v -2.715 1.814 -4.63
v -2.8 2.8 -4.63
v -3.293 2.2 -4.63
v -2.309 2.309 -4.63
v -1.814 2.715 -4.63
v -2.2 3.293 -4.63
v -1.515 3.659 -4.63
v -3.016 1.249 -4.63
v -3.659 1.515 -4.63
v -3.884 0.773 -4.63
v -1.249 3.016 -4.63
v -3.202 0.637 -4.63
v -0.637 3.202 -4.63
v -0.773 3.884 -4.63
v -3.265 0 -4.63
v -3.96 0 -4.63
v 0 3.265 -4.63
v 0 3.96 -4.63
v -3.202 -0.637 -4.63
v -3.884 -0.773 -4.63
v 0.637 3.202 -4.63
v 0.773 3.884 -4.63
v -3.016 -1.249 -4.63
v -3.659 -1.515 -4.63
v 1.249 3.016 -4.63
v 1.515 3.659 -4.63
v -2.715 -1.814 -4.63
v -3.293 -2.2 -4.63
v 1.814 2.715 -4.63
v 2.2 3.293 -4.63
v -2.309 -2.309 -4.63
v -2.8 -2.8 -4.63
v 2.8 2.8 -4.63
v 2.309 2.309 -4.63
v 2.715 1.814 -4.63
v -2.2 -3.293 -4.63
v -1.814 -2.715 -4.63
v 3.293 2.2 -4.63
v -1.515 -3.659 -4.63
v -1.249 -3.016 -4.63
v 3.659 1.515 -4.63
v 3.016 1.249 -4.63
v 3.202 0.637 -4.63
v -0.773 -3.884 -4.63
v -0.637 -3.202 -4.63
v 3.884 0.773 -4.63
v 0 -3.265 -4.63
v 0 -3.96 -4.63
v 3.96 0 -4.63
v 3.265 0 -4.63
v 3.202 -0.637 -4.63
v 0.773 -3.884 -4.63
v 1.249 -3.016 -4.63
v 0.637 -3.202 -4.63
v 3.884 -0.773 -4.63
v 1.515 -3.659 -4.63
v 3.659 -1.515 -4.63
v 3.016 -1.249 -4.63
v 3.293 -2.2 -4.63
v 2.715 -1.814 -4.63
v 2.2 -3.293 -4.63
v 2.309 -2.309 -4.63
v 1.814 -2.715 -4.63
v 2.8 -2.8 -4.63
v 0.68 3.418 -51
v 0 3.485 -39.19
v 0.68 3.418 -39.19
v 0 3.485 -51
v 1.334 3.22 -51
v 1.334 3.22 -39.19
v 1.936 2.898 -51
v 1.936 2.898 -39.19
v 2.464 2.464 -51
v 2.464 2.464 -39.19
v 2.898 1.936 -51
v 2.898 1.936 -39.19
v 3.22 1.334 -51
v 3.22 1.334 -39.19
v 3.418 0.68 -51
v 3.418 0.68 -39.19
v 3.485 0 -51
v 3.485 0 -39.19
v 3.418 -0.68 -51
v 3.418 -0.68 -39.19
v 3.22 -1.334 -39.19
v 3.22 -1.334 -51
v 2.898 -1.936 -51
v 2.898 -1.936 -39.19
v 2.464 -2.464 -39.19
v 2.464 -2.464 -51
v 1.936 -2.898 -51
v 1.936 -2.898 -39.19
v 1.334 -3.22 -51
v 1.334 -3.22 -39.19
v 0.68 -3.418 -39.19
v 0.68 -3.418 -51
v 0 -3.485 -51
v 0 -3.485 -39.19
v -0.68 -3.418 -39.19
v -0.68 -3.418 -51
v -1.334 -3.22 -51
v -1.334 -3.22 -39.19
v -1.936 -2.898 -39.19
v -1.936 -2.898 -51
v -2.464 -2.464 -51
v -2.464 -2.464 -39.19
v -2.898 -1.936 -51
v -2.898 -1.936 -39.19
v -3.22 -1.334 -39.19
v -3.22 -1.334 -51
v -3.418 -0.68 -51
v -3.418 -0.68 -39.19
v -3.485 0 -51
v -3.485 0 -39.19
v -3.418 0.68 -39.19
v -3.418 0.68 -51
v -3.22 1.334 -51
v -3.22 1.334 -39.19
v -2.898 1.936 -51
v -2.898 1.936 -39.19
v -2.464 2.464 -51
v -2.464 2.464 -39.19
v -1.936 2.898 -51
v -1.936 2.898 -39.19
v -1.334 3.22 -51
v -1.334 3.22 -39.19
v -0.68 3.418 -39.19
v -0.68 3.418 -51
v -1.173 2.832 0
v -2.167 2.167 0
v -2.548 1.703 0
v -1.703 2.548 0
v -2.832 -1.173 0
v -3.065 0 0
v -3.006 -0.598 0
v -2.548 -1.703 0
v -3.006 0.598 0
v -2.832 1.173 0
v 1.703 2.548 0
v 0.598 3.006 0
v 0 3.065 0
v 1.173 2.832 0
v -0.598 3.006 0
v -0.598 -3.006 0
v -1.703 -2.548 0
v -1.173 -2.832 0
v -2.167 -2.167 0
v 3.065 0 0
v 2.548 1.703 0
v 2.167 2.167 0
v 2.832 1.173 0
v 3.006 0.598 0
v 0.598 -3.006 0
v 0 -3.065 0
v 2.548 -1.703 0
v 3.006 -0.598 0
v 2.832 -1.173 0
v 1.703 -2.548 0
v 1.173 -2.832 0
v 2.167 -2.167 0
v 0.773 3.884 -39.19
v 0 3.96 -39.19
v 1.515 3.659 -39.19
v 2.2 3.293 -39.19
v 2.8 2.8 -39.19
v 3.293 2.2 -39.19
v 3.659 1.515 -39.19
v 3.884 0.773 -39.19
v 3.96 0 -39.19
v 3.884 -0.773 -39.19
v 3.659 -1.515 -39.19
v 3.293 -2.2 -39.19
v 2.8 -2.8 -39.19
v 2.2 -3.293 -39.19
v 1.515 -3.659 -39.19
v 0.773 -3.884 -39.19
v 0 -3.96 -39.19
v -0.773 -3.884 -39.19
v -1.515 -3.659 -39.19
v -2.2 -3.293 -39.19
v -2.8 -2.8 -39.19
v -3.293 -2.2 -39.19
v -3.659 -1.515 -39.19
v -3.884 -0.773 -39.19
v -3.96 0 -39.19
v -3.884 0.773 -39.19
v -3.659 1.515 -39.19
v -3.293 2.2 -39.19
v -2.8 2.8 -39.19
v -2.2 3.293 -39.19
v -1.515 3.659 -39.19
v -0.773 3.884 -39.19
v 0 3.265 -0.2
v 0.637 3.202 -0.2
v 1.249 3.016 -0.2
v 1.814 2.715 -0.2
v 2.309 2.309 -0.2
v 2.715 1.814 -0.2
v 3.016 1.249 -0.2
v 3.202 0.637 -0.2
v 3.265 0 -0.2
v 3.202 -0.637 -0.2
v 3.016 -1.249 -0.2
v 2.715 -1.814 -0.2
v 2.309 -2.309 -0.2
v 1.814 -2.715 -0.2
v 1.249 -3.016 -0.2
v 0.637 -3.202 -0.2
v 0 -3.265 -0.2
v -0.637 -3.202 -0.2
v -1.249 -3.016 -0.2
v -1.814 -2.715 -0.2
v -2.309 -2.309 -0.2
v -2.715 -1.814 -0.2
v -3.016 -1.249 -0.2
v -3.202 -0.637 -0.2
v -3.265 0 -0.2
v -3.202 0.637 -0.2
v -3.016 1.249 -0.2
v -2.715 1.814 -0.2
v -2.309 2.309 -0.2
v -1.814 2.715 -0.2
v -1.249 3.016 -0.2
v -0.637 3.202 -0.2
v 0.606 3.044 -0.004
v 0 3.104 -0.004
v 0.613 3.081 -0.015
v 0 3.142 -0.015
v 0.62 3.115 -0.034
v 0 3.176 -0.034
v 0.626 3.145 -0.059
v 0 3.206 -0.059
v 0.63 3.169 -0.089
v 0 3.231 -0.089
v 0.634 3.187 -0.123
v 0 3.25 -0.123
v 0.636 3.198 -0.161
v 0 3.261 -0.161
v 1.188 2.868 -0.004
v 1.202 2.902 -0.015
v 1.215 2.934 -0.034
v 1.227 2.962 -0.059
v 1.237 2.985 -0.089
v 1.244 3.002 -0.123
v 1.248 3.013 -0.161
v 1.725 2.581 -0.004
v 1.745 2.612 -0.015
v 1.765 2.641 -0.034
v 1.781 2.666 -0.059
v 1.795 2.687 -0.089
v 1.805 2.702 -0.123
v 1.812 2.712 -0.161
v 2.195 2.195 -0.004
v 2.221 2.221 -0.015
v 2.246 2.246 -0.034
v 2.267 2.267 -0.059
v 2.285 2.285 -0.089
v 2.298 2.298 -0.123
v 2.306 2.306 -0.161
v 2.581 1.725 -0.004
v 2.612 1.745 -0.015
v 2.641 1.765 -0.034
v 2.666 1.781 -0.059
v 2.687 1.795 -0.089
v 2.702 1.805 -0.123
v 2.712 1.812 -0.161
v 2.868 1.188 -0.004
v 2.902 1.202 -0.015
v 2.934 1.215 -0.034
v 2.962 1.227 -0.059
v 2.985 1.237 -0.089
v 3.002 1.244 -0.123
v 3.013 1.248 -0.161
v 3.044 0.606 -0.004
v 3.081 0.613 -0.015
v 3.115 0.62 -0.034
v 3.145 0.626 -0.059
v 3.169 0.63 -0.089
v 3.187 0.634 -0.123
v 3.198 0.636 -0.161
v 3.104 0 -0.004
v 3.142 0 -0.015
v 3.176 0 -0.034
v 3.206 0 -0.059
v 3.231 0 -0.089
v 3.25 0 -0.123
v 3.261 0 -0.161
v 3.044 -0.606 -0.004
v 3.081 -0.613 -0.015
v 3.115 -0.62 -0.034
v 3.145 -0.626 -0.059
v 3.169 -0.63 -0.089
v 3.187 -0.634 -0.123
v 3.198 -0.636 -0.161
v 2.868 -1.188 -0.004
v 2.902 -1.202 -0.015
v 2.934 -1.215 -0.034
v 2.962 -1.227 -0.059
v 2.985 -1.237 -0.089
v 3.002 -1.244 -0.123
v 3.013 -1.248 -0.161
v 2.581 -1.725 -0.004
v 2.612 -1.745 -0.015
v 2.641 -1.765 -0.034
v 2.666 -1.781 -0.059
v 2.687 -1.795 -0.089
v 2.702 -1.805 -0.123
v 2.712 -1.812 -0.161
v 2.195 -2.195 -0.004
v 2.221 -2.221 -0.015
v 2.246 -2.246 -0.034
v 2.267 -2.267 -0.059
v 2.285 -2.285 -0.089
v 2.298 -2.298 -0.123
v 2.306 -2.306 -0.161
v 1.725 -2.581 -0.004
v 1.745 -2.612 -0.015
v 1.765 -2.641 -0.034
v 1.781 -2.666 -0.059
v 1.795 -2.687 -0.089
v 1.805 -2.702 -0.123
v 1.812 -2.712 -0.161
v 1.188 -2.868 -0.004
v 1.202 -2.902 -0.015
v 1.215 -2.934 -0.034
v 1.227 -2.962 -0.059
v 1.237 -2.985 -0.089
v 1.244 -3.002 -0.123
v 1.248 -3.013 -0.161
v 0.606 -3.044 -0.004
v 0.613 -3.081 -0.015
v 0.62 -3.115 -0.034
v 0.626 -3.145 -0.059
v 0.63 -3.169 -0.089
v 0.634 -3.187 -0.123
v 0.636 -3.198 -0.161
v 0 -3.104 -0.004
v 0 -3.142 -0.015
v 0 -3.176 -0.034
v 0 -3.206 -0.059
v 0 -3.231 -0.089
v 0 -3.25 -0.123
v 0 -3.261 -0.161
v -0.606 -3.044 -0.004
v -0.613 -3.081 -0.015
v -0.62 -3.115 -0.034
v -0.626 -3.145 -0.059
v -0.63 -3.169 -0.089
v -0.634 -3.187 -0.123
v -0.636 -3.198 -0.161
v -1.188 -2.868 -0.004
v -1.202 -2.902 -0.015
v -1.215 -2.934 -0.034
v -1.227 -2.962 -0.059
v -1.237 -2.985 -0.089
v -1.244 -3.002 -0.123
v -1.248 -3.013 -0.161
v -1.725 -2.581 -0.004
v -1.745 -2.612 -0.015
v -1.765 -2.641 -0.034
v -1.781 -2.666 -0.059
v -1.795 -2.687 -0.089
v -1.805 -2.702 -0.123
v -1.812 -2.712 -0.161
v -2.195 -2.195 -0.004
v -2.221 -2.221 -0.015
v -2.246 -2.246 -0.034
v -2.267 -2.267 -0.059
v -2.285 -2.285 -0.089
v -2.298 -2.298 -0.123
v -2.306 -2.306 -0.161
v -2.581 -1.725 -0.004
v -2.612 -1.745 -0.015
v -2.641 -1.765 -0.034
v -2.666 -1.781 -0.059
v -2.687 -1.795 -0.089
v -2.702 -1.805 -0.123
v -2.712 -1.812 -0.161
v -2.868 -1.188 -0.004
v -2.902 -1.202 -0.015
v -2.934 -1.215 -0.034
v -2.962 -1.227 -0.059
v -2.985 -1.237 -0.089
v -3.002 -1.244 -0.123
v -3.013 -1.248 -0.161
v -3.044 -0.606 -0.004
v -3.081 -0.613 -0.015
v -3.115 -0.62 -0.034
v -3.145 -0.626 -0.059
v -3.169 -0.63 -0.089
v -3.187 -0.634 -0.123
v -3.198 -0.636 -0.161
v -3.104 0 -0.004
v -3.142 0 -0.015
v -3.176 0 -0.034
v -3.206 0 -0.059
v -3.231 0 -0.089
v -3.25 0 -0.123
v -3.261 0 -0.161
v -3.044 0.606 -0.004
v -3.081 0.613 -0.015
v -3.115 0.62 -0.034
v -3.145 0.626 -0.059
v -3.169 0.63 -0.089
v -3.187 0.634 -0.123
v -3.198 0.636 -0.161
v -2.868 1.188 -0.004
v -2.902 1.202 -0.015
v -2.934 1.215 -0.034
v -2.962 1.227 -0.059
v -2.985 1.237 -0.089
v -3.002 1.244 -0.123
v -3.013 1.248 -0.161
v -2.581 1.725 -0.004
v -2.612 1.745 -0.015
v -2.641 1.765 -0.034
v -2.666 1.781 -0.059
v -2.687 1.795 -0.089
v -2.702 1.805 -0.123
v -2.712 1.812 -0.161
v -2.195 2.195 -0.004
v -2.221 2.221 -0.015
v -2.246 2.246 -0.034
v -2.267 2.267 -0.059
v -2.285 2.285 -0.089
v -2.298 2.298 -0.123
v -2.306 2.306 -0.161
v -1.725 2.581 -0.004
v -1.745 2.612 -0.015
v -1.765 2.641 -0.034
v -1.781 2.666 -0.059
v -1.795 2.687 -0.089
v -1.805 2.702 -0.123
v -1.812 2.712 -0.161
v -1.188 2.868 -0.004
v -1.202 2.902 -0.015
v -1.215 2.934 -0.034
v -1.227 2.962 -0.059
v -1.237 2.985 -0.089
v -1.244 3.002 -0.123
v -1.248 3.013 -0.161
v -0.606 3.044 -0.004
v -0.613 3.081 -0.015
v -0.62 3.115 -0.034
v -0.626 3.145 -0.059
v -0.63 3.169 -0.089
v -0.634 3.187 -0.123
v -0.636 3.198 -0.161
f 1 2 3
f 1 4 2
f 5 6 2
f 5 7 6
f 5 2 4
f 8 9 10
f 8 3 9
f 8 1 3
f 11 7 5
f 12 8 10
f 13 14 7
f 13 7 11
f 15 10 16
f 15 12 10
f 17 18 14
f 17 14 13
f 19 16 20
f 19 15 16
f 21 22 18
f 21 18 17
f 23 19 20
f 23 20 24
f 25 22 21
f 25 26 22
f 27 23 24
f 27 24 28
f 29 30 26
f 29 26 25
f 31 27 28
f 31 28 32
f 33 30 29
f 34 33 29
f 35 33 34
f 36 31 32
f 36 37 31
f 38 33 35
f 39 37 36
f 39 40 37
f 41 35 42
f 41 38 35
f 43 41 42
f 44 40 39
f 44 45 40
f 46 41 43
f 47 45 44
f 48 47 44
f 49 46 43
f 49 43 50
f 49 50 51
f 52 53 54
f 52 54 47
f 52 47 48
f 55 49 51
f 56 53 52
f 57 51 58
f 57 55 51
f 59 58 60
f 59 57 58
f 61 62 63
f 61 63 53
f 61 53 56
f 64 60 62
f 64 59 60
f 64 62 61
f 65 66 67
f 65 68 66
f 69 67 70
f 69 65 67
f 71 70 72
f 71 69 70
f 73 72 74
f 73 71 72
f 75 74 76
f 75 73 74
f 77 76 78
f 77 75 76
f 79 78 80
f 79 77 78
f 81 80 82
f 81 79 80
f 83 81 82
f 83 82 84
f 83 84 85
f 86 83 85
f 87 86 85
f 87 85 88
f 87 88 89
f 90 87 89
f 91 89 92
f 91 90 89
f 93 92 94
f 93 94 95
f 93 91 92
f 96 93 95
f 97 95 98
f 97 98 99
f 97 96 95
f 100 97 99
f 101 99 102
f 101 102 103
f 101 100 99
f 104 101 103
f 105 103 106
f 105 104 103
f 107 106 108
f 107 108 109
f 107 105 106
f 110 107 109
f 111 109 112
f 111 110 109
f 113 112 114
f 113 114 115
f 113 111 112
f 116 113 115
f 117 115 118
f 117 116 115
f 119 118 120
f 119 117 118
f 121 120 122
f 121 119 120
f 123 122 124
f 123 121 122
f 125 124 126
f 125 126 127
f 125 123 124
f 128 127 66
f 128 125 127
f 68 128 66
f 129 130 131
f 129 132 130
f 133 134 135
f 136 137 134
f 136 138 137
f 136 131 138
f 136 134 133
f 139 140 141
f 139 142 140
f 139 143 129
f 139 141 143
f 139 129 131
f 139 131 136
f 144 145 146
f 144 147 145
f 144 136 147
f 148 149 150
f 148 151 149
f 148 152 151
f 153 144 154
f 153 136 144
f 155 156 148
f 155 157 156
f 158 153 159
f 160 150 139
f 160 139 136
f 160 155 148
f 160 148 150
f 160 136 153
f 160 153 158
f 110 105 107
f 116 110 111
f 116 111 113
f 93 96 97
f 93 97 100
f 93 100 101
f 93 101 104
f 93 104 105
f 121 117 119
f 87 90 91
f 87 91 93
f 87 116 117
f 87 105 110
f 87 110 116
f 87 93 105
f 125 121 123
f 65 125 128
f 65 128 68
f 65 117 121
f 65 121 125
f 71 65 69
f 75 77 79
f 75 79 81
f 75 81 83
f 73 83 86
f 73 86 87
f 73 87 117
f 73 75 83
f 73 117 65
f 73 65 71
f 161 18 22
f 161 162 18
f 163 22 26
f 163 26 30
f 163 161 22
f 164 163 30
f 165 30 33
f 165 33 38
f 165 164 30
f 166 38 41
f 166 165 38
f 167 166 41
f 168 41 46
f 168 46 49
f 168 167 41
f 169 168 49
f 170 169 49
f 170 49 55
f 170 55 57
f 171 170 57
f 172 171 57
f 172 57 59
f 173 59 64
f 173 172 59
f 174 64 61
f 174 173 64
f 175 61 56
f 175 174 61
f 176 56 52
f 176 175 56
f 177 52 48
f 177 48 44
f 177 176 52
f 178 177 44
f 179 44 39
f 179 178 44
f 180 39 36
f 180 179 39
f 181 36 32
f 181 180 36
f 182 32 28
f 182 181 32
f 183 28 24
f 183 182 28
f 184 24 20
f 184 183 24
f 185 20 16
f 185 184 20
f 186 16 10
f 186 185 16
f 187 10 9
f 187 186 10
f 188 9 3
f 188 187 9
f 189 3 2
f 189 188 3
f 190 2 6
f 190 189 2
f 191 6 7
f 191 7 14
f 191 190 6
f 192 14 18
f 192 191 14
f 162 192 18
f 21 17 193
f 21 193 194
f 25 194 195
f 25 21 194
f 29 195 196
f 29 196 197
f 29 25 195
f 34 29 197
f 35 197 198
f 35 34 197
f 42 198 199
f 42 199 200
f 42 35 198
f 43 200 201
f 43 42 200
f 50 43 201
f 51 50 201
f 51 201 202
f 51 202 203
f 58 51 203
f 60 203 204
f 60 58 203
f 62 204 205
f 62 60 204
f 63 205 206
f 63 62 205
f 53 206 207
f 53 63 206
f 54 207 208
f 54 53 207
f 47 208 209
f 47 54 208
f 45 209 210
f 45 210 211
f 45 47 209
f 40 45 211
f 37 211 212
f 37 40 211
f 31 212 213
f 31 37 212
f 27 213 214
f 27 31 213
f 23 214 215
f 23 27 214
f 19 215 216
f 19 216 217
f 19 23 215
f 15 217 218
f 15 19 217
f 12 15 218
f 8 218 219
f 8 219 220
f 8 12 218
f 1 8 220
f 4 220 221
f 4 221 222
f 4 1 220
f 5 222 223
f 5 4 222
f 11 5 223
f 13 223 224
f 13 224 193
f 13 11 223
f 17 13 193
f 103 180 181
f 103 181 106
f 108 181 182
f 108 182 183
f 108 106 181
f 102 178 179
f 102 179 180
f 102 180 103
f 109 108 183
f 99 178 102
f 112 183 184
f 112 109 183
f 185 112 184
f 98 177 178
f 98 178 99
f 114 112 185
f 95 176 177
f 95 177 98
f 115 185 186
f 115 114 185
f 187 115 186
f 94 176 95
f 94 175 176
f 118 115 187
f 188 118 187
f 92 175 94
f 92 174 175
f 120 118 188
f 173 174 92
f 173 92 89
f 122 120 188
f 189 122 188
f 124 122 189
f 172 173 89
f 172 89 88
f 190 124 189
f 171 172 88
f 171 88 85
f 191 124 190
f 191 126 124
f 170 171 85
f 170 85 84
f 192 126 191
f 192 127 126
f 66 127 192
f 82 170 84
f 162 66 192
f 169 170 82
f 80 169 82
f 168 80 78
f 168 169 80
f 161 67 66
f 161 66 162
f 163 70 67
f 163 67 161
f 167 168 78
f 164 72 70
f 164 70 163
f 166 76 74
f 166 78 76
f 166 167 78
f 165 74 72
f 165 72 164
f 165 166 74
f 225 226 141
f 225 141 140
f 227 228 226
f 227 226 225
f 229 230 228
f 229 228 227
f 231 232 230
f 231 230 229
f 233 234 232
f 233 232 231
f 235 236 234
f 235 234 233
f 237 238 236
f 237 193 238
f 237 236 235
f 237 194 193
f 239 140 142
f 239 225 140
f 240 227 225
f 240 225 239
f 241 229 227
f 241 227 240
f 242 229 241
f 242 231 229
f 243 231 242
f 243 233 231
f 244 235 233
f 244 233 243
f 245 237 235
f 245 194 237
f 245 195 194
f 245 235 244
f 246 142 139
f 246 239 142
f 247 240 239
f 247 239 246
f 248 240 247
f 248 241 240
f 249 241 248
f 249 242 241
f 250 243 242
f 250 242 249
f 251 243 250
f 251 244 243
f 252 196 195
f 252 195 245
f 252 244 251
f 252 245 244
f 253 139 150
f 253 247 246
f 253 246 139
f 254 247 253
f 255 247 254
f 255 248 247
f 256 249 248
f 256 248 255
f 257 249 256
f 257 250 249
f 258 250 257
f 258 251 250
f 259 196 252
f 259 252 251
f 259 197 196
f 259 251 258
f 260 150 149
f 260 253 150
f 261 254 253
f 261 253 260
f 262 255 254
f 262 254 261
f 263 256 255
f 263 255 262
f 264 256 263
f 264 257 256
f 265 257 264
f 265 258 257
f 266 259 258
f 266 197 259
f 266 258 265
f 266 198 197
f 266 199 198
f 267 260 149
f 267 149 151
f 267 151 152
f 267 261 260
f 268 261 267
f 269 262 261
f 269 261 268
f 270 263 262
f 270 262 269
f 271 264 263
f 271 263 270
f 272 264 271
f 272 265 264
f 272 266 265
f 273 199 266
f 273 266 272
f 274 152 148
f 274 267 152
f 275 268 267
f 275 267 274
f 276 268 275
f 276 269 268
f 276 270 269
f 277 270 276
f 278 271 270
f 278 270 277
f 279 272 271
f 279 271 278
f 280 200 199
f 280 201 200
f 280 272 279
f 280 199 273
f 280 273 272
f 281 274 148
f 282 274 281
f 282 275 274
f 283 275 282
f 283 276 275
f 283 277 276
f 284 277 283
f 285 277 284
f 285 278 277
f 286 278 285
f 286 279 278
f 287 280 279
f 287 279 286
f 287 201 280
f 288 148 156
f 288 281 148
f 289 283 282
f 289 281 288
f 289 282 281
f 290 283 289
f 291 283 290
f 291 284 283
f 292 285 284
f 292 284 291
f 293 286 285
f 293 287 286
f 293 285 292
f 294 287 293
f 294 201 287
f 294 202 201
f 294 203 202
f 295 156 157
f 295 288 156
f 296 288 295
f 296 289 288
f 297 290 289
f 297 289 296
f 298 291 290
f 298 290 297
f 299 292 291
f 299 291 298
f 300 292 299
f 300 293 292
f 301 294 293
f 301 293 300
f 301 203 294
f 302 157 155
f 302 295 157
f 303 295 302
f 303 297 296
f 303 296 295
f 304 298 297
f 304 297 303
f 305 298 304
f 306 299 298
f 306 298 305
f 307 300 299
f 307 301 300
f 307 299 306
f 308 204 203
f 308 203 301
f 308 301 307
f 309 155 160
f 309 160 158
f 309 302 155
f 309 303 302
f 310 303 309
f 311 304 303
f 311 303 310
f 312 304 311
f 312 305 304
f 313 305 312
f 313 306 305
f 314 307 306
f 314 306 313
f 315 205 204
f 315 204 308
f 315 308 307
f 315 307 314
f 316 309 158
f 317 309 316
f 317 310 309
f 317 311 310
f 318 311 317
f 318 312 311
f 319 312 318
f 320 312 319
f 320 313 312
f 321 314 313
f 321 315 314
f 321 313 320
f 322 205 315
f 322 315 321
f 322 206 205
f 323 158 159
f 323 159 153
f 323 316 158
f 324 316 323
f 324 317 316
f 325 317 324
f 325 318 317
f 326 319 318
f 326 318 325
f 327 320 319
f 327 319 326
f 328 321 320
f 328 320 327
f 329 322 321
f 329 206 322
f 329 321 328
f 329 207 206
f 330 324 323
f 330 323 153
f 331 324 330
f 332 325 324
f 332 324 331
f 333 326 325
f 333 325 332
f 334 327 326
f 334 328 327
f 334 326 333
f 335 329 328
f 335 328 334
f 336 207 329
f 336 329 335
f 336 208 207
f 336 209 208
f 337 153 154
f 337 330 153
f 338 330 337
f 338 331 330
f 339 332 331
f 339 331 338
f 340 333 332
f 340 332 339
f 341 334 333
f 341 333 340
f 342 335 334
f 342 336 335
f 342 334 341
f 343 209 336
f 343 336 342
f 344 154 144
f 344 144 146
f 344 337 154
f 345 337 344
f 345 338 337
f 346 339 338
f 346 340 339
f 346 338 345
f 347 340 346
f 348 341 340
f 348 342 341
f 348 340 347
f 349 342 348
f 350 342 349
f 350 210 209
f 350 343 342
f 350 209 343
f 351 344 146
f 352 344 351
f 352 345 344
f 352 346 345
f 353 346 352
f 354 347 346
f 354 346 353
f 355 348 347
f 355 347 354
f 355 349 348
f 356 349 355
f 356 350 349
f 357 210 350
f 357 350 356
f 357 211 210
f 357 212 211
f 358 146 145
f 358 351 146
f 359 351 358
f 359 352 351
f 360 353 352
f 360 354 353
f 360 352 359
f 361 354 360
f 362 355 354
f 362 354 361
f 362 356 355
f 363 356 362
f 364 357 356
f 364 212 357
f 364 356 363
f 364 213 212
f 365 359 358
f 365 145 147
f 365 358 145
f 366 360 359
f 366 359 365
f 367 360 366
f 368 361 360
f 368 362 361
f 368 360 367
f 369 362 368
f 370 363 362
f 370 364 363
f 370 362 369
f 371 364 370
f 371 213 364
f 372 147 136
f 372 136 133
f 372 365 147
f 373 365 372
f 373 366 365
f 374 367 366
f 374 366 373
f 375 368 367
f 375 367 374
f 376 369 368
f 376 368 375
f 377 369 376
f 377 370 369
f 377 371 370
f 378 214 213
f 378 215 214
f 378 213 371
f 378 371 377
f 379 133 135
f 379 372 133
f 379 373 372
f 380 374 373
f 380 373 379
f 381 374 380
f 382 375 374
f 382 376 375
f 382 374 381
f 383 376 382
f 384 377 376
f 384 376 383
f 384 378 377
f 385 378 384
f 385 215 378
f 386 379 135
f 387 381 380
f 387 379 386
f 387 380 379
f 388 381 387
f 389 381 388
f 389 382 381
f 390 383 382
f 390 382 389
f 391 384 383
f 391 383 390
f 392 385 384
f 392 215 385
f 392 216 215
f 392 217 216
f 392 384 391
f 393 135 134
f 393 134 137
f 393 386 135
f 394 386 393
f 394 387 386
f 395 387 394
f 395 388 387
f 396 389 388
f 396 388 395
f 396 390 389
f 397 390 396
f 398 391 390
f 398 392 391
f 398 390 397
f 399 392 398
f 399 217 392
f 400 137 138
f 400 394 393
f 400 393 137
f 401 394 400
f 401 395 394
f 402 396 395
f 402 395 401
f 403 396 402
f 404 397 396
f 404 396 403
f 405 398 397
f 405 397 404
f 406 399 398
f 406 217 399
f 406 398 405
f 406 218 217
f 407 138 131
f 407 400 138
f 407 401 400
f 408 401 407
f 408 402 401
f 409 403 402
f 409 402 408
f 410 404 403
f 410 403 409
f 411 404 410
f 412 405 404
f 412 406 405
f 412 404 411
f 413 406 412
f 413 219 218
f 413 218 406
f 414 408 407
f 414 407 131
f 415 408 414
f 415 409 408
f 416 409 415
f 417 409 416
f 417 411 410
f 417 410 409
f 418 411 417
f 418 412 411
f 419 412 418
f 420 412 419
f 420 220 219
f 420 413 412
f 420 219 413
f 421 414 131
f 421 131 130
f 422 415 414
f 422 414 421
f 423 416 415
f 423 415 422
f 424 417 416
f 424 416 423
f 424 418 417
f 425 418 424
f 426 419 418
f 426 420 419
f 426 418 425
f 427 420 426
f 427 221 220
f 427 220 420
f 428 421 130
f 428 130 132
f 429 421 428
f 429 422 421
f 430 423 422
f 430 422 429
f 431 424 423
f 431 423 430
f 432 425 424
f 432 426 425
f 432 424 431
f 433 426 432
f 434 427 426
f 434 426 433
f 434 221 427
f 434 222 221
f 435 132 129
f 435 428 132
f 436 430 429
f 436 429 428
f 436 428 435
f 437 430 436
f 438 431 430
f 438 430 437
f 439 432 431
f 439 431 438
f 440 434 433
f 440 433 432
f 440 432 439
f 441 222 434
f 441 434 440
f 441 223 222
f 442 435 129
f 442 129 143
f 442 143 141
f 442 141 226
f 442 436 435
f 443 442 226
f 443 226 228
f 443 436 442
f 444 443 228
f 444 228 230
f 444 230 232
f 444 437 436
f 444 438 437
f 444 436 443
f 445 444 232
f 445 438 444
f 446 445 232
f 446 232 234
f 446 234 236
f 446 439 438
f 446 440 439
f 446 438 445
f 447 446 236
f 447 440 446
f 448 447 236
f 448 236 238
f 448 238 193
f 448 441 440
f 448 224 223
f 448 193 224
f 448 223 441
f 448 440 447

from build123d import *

# Parameters (mm, degrees)
FILLET1_R = 0.2


with BuildPart() as part:
    # Sketch1 → Revolve1 (revolve)
    with BuildSketch(Plane(origin=(0, 0, 0), x_dir=(0, 0, -1), z_dir=(1, 0, 0))):
        Polygon((0, 0), (0, 3.265), (4.63, 3.265), (4.63, 3.96), (39.19, 3.96), (39.19, 3.485), (51, 3.485), (51, 0), align=None)
    revolve(axis=Axis((0, 0, 22.591484059), (0, 0, -1)))

    # Fillet1
    fillet1_edges = [part.edges().sort_by_distance(p)[0] for p in [
        (0, -3.265, 0),
    ]]
    fillet(fillet1_edges, radius=FILLET1_R)


solid = part.part
